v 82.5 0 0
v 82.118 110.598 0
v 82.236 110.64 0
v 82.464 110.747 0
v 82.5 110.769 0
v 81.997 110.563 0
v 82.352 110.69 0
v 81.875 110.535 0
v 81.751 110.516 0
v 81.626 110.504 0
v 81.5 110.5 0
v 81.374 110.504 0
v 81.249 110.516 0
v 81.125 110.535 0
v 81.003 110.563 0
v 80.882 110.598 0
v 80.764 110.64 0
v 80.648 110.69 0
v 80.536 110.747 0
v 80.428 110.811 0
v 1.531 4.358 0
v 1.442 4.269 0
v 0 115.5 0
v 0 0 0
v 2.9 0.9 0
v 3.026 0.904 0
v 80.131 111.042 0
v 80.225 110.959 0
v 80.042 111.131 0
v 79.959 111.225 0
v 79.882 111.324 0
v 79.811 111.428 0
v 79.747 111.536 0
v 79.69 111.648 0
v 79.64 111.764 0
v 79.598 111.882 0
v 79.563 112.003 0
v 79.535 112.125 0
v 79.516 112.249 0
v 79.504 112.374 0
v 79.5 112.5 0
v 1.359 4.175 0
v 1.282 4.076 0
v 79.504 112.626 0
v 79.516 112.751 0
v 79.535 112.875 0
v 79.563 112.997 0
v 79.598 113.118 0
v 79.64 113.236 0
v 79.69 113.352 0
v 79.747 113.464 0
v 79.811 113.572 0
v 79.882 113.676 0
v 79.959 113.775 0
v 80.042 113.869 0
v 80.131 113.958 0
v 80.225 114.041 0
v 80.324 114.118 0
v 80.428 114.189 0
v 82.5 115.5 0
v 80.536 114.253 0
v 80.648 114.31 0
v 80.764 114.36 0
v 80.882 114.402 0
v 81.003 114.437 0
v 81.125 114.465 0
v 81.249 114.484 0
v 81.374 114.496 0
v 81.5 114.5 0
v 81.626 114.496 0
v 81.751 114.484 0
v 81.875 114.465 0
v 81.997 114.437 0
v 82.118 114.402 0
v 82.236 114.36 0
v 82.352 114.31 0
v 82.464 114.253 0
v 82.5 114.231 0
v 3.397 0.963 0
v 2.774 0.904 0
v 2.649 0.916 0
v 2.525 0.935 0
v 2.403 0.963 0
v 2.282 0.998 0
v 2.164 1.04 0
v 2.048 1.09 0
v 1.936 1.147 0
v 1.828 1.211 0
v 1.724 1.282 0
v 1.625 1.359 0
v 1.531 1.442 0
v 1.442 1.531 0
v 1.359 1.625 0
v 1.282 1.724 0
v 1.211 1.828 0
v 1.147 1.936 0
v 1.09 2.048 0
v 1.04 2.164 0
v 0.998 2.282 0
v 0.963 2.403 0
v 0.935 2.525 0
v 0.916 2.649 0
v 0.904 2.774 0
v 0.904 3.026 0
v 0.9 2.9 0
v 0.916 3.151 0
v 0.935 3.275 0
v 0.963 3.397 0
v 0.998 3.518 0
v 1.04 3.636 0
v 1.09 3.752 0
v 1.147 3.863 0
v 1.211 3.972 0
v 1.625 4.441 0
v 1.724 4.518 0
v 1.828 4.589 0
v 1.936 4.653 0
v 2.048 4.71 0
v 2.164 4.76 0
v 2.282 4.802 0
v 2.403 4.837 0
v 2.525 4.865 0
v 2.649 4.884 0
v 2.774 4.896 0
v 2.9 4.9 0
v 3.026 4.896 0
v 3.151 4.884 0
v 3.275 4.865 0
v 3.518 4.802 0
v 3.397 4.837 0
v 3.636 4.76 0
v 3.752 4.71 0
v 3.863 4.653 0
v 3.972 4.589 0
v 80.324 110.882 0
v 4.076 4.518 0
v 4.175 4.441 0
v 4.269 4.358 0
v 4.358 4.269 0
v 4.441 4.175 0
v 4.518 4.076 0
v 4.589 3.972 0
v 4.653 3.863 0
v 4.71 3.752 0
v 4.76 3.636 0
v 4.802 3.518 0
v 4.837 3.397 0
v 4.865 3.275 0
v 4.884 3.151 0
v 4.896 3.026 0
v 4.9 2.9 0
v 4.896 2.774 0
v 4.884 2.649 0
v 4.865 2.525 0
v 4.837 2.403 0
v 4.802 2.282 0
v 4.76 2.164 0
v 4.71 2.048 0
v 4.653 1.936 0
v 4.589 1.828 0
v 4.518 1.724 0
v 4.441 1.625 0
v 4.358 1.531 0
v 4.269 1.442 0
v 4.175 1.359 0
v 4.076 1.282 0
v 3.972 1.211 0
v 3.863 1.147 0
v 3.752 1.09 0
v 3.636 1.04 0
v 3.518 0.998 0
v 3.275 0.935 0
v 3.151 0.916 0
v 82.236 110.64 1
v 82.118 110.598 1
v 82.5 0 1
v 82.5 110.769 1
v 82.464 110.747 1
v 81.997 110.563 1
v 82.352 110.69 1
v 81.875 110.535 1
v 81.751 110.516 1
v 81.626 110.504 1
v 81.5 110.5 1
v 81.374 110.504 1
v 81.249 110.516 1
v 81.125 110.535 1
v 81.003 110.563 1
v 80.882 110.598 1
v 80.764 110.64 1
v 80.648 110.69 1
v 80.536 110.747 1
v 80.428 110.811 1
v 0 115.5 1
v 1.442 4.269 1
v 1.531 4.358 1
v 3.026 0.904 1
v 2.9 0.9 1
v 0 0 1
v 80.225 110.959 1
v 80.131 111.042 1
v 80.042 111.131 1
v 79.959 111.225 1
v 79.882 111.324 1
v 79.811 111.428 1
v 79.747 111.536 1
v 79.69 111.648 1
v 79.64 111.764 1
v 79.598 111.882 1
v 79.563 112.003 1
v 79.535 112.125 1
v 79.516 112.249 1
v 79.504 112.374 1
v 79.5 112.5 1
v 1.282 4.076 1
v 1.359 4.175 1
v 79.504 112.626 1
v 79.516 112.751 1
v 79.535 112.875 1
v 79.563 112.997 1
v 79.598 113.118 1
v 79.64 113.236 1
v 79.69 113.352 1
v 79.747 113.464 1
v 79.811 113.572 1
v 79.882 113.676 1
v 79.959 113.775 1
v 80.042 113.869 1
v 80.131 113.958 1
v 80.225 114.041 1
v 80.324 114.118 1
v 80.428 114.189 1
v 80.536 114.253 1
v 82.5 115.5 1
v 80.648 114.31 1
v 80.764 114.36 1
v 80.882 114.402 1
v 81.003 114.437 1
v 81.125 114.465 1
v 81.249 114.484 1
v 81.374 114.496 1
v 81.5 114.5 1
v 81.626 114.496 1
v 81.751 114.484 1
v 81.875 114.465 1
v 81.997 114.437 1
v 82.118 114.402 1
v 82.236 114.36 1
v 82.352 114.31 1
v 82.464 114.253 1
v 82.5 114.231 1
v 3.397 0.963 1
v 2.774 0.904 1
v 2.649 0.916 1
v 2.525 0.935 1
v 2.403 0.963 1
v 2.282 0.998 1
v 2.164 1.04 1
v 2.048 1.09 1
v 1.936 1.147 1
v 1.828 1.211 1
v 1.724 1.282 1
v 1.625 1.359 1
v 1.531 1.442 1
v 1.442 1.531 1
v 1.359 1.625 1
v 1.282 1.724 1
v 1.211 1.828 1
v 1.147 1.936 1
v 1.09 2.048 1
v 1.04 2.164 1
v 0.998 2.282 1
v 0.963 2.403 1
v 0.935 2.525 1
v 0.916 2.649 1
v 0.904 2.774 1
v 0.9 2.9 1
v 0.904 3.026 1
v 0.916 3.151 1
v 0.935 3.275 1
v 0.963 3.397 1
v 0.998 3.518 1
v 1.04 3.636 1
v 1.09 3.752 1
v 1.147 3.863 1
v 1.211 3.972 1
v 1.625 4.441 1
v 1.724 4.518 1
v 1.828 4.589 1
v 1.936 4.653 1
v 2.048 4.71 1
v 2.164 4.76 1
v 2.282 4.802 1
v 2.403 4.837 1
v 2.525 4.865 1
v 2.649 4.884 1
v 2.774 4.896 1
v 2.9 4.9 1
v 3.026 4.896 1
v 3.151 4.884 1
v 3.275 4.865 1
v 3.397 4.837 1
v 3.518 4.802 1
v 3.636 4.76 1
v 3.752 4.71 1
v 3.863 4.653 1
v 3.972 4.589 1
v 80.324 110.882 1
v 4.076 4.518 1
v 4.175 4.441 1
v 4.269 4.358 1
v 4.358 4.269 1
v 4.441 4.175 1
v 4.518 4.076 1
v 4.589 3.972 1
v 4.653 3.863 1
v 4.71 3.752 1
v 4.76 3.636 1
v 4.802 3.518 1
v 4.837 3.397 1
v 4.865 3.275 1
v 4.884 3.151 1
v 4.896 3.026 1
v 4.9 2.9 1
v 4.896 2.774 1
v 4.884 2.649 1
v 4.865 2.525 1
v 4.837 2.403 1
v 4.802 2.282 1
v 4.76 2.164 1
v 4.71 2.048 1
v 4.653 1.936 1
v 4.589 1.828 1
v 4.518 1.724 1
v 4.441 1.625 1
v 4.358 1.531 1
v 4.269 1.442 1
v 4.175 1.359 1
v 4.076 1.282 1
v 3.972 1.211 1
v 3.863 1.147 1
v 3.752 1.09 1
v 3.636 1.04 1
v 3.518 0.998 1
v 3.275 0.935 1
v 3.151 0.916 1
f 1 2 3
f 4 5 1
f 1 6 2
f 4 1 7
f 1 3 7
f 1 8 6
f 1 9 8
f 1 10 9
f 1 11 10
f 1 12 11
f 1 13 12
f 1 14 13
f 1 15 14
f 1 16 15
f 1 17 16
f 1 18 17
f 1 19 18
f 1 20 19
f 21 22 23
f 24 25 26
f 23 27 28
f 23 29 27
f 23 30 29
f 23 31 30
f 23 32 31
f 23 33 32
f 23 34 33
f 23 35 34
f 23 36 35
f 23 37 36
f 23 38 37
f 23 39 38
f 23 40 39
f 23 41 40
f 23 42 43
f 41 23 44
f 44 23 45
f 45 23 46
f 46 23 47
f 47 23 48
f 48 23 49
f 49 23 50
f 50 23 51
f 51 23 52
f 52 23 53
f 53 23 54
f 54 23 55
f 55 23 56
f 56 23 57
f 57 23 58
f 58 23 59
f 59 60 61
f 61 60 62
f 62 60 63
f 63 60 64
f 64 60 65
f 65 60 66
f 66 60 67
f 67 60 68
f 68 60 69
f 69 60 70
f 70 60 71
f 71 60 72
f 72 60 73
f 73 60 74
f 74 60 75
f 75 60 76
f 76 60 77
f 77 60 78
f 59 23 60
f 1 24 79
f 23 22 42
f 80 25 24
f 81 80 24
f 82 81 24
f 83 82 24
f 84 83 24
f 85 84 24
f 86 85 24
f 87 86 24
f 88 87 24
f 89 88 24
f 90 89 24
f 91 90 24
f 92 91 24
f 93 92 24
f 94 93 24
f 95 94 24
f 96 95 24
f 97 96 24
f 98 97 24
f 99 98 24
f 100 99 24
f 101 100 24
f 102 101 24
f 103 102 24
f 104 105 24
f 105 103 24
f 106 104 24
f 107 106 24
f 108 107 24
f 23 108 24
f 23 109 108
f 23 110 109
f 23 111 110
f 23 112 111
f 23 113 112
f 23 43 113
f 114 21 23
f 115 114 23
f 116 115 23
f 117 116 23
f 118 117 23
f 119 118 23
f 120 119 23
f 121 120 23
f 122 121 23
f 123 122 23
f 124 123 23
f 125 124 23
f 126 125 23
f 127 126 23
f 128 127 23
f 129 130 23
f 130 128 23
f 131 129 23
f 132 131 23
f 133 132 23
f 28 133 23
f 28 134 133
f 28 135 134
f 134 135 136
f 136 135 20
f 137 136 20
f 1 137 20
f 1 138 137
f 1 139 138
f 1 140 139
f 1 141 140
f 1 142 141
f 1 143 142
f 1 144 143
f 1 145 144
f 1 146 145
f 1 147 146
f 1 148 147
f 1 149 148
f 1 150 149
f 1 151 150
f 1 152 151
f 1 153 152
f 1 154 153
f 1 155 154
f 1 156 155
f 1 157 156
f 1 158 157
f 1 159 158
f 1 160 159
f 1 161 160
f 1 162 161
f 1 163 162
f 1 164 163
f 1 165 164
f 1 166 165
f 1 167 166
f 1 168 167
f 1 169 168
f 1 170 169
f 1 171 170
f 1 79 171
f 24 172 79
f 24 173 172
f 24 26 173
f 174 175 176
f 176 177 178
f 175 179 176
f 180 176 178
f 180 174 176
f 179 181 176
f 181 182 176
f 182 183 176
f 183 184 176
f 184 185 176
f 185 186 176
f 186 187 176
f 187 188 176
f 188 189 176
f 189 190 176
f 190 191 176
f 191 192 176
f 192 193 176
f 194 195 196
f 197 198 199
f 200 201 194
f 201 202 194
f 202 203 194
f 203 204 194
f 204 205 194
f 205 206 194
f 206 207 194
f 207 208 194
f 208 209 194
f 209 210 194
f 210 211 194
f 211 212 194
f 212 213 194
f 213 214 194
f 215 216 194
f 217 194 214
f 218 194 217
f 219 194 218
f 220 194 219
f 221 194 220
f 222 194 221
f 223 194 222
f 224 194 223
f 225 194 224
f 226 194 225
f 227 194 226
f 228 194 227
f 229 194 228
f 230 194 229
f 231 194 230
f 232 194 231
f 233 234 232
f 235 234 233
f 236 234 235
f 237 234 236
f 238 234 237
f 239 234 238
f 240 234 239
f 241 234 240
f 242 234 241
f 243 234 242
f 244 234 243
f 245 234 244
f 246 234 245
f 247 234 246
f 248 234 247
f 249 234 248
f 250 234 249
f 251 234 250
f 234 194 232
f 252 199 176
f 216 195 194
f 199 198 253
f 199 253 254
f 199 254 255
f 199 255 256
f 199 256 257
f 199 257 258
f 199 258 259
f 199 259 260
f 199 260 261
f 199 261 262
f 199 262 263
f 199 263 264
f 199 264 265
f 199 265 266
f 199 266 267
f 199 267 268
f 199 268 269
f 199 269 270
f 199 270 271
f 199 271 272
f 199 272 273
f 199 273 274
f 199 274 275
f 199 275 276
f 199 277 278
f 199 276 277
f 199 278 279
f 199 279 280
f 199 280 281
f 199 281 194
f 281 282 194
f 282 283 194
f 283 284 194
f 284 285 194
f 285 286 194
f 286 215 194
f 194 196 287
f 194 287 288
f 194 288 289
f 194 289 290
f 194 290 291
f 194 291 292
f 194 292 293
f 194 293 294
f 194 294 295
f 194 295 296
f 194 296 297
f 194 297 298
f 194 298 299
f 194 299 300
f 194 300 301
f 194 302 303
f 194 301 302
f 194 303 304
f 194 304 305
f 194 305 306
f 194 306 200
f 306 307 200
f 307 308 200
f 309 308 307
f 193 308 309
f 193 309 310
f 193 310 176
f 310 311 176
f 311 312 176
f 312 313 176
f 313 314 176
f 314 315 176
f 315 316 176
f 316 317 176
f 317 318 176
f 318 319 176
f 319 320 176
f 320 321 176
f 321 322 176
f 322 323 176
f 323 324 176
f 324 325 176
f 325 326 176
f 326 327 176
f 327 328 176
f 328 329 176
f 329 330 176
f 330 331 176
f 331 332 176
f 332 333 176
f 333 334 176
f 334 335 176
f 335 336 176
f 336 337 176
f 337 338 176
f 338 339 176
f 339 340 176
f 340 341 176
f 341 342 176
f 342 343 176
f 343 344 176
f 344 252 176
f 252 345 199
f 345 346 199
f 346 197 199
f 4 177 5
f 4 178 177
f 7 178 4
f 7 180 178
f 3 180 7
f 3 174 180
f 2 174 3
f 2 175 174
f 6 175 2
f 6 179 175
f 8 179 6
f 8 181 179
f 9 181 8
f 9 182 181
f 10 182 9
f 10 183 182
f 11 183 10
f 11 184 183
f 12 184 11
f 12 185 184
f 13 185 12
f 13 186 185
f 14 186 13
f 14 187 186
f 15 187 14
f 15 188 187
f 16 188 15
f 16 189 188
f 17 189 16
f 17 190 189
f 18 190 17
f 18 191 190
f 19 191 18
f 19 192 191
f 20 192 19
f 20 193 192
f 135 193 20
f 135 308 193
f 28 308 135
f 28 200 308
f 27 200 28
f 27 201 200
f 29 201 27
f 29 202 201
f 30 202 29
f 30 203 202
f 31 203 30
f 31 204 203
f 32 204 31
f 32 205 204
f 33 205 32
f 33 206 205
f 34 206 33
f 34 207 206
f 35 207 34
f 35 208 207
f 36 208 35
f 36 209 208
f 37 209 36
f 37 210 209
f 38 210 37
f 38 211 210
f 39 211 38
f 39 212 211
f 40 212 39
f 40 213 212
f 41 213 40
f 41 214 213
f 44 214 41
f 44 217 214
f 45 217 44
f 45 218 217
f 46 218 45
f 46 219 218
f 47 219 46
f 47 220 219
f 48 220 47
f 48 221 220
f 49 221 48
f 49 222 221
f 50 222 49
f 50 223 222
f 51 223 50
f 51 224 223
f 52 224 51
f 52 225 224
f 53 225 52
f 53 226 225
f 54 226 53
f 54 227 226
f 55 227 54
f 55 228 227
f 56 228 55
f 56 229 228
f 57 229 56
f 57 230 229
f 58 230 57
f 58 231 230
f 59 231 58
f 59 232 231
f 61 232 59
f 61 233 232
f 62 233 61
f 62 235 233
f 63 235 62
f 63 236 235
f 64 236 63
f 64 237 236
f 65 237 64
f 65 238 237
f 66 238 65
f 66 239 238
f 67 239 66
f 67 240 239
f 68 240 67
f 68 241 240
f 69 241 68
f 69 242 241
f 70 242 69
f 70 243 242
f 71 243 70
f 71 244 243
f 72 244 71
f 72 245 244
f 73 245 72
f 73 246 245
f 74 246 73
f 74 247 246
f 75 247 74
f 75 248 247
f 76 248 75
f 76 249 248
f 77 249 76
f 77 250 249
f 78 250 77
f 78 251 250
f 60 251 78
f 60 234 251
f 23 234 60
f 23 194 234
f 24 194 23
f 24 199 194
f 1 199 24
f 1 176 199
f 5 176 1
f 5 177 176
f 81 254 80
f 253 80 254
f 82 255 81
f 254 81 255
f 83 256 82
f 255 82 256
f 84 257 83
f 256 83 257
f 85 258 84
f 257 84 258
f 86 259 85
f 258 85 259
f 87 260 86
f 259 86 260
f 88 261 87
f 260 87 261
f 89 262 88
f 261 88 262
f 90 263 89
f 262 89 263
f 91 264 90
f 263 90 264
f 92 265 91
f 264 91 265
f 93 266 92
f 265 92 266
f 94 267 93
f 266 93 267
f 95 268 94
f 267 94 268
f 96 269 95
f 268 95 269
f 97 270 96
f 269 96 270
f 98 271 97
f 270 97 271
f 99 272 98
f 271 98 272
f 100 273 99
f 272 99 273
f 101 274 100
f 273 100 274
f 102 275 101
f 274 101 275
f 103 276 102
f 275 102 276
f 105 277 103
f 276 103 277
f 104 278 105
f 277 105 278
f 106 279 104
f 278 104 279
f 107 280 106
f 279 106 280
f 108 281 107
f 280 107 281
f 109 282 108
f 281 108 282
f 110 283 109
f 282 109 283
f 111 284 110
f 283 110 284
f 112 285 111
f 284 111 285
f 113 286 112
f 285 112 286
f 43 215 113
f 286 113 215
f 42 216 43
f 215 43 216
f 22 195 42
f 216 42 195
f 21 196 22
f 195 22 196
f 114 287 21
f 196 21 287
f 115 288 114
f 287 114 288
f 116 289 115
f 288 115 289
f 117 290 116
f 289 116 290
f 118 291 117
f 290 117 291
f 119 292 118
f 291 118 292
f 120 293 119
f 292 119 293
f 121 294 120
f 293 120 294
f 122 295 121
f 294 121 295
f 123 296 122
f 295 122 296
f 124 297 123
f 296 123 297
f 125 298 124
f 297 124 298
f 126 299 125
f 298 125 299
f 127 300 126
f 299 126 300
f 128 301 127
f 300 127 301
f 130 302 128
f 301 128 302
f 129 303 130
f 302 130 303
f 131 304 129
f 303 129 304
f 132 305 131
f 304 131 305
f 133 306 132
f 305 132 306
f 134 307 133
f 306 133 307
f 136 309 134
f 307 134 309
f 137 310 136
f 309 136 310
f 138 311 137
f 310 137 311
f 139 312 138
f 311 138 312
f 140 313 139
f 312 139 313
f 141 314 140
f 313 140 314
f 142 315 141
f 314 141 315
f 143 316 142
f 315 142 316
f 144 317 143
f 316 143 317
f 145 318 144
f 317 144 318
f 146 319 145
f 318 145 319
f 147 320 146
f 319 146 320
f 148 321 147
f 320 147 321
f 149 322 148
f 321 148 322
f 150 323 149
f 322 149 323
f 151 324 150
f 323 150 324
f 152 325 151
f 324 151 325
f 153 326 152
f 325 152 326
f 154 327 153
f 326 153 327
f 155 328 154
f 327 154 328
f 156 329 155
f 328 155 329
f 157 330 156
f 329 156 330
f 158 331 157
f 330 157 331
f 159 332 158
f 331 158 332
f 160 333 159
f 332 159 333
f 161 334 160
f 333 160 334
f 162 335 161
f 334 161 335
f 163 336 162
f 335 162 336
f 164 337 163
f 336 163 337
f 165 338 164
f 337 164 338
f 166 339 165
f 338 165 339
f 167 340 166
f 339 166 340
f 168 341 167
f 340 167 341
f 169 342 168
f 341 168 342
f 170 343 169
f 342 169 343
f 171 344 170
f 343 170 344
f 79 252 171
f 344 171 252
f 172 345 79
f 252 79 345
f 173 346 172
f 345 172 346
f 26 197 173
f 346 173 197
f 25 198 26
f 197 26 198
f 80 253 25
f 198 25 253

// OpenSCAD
PSU_WIDTH = 82.5;
PSU_HEIGHT = 115.5;

module main(){
  linear_extrude(1)
  base_connector();
}

module base_connector(){
  difference(){
    square([PSU_WIDTH, PSU_HEIGHT]);

    translate([2.9, 2.9, 0])
    m4_6_screw_2d();

    translate([PSU_WIDTH-1, PSU_HEIGHT-3, 0])
    m4_6_screw_2d();    
  }
}

module m4_6_screw_2d(){
  $fn = 100;
  circle(2);
}


module m4_6_screw_3d(length){
  linear_extrude(length)
    m4_6_screw_2d();
}

module m4_6_nut_2d(){
  $fn = 6;
  circle(4.1);
}
module m4_6_nut_3d(length){
  linear_extrude(length)
  m4_6_nut_2d();
}


main();
